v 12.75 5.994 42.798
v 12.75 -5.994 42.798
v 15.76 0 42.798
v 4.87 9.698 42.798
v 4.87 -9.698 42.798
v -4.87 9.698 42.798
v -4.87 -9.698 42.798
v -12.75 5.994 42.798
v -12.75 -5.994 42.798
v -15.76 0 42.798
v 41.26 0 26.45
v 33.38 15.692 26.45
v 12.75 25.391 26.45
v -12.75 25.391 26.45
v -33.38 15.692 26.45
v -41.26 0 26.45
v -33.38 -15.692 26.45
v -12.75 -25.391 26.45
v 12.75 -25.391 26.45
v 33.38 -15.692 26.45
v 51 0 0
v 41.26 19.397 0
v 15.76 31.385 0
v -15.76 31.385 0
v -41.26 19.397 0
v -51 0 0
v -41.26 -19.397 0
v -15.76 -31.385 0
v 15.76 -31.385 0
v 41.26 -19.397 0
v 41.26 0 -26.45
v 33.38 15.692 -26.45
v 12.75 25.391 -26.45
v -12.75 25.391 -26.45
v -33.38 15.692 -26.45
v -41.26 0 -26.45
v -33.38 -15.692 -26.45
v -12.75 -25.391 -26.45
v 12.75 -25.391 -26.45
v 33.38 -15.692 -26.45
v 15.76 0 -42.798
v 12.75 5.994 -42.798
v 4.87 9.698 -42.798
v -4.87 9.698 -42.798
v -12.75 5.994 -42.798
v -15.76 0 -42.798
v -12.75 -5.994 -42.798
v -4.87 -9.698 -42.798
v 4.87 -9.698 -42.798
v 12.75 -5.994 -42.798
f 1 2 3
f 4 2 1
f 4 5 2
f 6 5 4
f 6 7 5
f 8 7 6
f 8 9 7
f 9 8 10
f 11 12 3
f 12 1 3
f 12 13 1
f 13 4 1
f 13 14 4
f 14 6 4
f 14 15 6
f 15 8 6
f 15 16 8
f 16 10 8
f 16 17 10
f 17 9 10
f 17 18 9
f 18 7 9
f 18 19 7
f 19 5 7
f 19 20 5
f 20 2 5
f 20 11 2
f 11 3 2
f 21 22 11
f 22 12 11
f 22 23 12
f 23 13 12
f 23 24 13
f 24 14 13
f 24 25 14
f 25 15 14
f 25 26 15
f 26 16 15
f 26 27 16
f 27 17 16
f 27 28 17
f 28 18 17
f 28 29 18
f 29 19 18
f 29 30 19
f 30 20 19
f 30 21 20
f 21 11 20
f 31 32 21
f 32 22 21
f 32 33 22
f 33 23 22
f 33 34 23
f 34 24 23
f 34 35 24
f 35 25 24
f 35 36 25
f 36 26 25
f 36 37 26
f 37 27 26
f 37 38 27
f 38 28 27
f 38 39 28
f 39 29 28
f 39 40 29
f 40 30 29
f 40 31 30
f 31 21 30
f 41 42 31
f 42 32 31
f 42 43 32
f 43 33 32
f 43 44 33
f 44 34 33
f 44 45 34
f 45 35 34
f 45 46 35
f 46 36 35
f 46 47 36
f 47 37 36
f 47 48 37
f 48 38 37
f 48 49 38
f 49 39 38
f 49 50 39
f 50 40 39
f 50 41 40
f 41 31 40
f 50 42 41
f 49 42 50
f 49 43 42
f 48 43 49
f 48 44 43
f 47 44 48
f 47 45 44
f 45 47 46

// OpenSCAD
// Generated by SolidPython 1.0.1 on 2020-07-29 00:46:53


scale(v = [17, 11, 15]) {
	sphere(r = 3);
}
/***********************************************
*********      SolidPython code:      **********
************************************************
 
# import packages: SolidPython
from solid import *
from solid.utils import *
from itertools import chain, combinations, permutations


class Resize:

    def __init__(self, scad_file):
        self.scad_file = scad_file
        #self.scad_file = import_scad(scad_file)
        # cone/cylinder param:
        self.r1 = 0
        self.r2 = 0
        self.h = 0
        # rectangular prism param:
        self.w = 0
        self.l = 0
        # ellipse param:
        self.r = 0

    # import OpenScad code (file name corresponds to shape)


    # classify shape + parameters
    def assign(self, param1, param2, param3):
        if self.scad_file == 'cone.scad':
            self.r1 = param1
            self.r2 = param2
            self.h = param3
        elif self.scad_file == 'cylinder.scad':
            self.r1 = param1
            self.r2 = param2
            self.h = param3
        elif self.scad_file == 'rectangularPrism.scad':
            self.h = param1
            self.l = param2
            self.w = param3
        else:
            self.r = param1
            self.h = param2

    # resize parameters
    def iterate(self):
        x = range(3, 20, 2)
        i = 1
        if self.scad_file == 'cone.scad':
            tempList = list(permutations(x, 2))
            for temp in tempList:
                param1 = temp[0]
                param2 = temp[1]
                filepath = 'produced_scad_files/' + 'cone' + str(param1) + '_' + str(param2) + '_' + '.scad'
                scad_render_to_file(cylinder(h=param1, r1=param2, r2=0), filepath)

        elif self.scad_file == 'cylinder.scad':
            tempList = list(permutations(x, 3))
            for temp in tempList:
                param1 = temp[0]
                param2 = temp[1]
                filepath = 'produced_scad_files/' + 'cylinder' + str(param1) + '_' + str(param2) + '_' + '.scad'
                scad_render_to_file(cylinder(h=param1, r1=param2, r2=param2), filepath)

        elif self.scad_file == 'rectangularPrism.scad':
            tempList = list(permutations(x, 3))
            for temp in tempList:
                param1 = temp[0]
                param2 = temp[1]
                param3 = temp[2]
                filepath = 'produced_scad_files/' + 'rectangularPrism' + str(param1) + '_' + str(param2) + '_' + str(
                    param3) + '.scad'
                scad_render_to_file(cube(size=(param1, param2, param3)), filepath)

        elif self.scad_file == 'ellipse.scad':
            tempList = list(permutations(x, 4))
            for temp in tempList:
                param1 = temp[0]
                param2 = temp[1]
                param3 = temp[2]
                param4 = temp[3]
                filepath = 'produced_scad_files/' + 'ellipse' + str(param1) + '_' + str(param2) + '_' + str(param3) + '_' + str(param4) + '.scad'
                scad_render_to_file(scale([param1, param2, param3])(sphere(r=param4)), filepath)

    def render_to_scadfile(self):
        scad_render_to_file(scad, 'example.scad') 
 
************************************************/
